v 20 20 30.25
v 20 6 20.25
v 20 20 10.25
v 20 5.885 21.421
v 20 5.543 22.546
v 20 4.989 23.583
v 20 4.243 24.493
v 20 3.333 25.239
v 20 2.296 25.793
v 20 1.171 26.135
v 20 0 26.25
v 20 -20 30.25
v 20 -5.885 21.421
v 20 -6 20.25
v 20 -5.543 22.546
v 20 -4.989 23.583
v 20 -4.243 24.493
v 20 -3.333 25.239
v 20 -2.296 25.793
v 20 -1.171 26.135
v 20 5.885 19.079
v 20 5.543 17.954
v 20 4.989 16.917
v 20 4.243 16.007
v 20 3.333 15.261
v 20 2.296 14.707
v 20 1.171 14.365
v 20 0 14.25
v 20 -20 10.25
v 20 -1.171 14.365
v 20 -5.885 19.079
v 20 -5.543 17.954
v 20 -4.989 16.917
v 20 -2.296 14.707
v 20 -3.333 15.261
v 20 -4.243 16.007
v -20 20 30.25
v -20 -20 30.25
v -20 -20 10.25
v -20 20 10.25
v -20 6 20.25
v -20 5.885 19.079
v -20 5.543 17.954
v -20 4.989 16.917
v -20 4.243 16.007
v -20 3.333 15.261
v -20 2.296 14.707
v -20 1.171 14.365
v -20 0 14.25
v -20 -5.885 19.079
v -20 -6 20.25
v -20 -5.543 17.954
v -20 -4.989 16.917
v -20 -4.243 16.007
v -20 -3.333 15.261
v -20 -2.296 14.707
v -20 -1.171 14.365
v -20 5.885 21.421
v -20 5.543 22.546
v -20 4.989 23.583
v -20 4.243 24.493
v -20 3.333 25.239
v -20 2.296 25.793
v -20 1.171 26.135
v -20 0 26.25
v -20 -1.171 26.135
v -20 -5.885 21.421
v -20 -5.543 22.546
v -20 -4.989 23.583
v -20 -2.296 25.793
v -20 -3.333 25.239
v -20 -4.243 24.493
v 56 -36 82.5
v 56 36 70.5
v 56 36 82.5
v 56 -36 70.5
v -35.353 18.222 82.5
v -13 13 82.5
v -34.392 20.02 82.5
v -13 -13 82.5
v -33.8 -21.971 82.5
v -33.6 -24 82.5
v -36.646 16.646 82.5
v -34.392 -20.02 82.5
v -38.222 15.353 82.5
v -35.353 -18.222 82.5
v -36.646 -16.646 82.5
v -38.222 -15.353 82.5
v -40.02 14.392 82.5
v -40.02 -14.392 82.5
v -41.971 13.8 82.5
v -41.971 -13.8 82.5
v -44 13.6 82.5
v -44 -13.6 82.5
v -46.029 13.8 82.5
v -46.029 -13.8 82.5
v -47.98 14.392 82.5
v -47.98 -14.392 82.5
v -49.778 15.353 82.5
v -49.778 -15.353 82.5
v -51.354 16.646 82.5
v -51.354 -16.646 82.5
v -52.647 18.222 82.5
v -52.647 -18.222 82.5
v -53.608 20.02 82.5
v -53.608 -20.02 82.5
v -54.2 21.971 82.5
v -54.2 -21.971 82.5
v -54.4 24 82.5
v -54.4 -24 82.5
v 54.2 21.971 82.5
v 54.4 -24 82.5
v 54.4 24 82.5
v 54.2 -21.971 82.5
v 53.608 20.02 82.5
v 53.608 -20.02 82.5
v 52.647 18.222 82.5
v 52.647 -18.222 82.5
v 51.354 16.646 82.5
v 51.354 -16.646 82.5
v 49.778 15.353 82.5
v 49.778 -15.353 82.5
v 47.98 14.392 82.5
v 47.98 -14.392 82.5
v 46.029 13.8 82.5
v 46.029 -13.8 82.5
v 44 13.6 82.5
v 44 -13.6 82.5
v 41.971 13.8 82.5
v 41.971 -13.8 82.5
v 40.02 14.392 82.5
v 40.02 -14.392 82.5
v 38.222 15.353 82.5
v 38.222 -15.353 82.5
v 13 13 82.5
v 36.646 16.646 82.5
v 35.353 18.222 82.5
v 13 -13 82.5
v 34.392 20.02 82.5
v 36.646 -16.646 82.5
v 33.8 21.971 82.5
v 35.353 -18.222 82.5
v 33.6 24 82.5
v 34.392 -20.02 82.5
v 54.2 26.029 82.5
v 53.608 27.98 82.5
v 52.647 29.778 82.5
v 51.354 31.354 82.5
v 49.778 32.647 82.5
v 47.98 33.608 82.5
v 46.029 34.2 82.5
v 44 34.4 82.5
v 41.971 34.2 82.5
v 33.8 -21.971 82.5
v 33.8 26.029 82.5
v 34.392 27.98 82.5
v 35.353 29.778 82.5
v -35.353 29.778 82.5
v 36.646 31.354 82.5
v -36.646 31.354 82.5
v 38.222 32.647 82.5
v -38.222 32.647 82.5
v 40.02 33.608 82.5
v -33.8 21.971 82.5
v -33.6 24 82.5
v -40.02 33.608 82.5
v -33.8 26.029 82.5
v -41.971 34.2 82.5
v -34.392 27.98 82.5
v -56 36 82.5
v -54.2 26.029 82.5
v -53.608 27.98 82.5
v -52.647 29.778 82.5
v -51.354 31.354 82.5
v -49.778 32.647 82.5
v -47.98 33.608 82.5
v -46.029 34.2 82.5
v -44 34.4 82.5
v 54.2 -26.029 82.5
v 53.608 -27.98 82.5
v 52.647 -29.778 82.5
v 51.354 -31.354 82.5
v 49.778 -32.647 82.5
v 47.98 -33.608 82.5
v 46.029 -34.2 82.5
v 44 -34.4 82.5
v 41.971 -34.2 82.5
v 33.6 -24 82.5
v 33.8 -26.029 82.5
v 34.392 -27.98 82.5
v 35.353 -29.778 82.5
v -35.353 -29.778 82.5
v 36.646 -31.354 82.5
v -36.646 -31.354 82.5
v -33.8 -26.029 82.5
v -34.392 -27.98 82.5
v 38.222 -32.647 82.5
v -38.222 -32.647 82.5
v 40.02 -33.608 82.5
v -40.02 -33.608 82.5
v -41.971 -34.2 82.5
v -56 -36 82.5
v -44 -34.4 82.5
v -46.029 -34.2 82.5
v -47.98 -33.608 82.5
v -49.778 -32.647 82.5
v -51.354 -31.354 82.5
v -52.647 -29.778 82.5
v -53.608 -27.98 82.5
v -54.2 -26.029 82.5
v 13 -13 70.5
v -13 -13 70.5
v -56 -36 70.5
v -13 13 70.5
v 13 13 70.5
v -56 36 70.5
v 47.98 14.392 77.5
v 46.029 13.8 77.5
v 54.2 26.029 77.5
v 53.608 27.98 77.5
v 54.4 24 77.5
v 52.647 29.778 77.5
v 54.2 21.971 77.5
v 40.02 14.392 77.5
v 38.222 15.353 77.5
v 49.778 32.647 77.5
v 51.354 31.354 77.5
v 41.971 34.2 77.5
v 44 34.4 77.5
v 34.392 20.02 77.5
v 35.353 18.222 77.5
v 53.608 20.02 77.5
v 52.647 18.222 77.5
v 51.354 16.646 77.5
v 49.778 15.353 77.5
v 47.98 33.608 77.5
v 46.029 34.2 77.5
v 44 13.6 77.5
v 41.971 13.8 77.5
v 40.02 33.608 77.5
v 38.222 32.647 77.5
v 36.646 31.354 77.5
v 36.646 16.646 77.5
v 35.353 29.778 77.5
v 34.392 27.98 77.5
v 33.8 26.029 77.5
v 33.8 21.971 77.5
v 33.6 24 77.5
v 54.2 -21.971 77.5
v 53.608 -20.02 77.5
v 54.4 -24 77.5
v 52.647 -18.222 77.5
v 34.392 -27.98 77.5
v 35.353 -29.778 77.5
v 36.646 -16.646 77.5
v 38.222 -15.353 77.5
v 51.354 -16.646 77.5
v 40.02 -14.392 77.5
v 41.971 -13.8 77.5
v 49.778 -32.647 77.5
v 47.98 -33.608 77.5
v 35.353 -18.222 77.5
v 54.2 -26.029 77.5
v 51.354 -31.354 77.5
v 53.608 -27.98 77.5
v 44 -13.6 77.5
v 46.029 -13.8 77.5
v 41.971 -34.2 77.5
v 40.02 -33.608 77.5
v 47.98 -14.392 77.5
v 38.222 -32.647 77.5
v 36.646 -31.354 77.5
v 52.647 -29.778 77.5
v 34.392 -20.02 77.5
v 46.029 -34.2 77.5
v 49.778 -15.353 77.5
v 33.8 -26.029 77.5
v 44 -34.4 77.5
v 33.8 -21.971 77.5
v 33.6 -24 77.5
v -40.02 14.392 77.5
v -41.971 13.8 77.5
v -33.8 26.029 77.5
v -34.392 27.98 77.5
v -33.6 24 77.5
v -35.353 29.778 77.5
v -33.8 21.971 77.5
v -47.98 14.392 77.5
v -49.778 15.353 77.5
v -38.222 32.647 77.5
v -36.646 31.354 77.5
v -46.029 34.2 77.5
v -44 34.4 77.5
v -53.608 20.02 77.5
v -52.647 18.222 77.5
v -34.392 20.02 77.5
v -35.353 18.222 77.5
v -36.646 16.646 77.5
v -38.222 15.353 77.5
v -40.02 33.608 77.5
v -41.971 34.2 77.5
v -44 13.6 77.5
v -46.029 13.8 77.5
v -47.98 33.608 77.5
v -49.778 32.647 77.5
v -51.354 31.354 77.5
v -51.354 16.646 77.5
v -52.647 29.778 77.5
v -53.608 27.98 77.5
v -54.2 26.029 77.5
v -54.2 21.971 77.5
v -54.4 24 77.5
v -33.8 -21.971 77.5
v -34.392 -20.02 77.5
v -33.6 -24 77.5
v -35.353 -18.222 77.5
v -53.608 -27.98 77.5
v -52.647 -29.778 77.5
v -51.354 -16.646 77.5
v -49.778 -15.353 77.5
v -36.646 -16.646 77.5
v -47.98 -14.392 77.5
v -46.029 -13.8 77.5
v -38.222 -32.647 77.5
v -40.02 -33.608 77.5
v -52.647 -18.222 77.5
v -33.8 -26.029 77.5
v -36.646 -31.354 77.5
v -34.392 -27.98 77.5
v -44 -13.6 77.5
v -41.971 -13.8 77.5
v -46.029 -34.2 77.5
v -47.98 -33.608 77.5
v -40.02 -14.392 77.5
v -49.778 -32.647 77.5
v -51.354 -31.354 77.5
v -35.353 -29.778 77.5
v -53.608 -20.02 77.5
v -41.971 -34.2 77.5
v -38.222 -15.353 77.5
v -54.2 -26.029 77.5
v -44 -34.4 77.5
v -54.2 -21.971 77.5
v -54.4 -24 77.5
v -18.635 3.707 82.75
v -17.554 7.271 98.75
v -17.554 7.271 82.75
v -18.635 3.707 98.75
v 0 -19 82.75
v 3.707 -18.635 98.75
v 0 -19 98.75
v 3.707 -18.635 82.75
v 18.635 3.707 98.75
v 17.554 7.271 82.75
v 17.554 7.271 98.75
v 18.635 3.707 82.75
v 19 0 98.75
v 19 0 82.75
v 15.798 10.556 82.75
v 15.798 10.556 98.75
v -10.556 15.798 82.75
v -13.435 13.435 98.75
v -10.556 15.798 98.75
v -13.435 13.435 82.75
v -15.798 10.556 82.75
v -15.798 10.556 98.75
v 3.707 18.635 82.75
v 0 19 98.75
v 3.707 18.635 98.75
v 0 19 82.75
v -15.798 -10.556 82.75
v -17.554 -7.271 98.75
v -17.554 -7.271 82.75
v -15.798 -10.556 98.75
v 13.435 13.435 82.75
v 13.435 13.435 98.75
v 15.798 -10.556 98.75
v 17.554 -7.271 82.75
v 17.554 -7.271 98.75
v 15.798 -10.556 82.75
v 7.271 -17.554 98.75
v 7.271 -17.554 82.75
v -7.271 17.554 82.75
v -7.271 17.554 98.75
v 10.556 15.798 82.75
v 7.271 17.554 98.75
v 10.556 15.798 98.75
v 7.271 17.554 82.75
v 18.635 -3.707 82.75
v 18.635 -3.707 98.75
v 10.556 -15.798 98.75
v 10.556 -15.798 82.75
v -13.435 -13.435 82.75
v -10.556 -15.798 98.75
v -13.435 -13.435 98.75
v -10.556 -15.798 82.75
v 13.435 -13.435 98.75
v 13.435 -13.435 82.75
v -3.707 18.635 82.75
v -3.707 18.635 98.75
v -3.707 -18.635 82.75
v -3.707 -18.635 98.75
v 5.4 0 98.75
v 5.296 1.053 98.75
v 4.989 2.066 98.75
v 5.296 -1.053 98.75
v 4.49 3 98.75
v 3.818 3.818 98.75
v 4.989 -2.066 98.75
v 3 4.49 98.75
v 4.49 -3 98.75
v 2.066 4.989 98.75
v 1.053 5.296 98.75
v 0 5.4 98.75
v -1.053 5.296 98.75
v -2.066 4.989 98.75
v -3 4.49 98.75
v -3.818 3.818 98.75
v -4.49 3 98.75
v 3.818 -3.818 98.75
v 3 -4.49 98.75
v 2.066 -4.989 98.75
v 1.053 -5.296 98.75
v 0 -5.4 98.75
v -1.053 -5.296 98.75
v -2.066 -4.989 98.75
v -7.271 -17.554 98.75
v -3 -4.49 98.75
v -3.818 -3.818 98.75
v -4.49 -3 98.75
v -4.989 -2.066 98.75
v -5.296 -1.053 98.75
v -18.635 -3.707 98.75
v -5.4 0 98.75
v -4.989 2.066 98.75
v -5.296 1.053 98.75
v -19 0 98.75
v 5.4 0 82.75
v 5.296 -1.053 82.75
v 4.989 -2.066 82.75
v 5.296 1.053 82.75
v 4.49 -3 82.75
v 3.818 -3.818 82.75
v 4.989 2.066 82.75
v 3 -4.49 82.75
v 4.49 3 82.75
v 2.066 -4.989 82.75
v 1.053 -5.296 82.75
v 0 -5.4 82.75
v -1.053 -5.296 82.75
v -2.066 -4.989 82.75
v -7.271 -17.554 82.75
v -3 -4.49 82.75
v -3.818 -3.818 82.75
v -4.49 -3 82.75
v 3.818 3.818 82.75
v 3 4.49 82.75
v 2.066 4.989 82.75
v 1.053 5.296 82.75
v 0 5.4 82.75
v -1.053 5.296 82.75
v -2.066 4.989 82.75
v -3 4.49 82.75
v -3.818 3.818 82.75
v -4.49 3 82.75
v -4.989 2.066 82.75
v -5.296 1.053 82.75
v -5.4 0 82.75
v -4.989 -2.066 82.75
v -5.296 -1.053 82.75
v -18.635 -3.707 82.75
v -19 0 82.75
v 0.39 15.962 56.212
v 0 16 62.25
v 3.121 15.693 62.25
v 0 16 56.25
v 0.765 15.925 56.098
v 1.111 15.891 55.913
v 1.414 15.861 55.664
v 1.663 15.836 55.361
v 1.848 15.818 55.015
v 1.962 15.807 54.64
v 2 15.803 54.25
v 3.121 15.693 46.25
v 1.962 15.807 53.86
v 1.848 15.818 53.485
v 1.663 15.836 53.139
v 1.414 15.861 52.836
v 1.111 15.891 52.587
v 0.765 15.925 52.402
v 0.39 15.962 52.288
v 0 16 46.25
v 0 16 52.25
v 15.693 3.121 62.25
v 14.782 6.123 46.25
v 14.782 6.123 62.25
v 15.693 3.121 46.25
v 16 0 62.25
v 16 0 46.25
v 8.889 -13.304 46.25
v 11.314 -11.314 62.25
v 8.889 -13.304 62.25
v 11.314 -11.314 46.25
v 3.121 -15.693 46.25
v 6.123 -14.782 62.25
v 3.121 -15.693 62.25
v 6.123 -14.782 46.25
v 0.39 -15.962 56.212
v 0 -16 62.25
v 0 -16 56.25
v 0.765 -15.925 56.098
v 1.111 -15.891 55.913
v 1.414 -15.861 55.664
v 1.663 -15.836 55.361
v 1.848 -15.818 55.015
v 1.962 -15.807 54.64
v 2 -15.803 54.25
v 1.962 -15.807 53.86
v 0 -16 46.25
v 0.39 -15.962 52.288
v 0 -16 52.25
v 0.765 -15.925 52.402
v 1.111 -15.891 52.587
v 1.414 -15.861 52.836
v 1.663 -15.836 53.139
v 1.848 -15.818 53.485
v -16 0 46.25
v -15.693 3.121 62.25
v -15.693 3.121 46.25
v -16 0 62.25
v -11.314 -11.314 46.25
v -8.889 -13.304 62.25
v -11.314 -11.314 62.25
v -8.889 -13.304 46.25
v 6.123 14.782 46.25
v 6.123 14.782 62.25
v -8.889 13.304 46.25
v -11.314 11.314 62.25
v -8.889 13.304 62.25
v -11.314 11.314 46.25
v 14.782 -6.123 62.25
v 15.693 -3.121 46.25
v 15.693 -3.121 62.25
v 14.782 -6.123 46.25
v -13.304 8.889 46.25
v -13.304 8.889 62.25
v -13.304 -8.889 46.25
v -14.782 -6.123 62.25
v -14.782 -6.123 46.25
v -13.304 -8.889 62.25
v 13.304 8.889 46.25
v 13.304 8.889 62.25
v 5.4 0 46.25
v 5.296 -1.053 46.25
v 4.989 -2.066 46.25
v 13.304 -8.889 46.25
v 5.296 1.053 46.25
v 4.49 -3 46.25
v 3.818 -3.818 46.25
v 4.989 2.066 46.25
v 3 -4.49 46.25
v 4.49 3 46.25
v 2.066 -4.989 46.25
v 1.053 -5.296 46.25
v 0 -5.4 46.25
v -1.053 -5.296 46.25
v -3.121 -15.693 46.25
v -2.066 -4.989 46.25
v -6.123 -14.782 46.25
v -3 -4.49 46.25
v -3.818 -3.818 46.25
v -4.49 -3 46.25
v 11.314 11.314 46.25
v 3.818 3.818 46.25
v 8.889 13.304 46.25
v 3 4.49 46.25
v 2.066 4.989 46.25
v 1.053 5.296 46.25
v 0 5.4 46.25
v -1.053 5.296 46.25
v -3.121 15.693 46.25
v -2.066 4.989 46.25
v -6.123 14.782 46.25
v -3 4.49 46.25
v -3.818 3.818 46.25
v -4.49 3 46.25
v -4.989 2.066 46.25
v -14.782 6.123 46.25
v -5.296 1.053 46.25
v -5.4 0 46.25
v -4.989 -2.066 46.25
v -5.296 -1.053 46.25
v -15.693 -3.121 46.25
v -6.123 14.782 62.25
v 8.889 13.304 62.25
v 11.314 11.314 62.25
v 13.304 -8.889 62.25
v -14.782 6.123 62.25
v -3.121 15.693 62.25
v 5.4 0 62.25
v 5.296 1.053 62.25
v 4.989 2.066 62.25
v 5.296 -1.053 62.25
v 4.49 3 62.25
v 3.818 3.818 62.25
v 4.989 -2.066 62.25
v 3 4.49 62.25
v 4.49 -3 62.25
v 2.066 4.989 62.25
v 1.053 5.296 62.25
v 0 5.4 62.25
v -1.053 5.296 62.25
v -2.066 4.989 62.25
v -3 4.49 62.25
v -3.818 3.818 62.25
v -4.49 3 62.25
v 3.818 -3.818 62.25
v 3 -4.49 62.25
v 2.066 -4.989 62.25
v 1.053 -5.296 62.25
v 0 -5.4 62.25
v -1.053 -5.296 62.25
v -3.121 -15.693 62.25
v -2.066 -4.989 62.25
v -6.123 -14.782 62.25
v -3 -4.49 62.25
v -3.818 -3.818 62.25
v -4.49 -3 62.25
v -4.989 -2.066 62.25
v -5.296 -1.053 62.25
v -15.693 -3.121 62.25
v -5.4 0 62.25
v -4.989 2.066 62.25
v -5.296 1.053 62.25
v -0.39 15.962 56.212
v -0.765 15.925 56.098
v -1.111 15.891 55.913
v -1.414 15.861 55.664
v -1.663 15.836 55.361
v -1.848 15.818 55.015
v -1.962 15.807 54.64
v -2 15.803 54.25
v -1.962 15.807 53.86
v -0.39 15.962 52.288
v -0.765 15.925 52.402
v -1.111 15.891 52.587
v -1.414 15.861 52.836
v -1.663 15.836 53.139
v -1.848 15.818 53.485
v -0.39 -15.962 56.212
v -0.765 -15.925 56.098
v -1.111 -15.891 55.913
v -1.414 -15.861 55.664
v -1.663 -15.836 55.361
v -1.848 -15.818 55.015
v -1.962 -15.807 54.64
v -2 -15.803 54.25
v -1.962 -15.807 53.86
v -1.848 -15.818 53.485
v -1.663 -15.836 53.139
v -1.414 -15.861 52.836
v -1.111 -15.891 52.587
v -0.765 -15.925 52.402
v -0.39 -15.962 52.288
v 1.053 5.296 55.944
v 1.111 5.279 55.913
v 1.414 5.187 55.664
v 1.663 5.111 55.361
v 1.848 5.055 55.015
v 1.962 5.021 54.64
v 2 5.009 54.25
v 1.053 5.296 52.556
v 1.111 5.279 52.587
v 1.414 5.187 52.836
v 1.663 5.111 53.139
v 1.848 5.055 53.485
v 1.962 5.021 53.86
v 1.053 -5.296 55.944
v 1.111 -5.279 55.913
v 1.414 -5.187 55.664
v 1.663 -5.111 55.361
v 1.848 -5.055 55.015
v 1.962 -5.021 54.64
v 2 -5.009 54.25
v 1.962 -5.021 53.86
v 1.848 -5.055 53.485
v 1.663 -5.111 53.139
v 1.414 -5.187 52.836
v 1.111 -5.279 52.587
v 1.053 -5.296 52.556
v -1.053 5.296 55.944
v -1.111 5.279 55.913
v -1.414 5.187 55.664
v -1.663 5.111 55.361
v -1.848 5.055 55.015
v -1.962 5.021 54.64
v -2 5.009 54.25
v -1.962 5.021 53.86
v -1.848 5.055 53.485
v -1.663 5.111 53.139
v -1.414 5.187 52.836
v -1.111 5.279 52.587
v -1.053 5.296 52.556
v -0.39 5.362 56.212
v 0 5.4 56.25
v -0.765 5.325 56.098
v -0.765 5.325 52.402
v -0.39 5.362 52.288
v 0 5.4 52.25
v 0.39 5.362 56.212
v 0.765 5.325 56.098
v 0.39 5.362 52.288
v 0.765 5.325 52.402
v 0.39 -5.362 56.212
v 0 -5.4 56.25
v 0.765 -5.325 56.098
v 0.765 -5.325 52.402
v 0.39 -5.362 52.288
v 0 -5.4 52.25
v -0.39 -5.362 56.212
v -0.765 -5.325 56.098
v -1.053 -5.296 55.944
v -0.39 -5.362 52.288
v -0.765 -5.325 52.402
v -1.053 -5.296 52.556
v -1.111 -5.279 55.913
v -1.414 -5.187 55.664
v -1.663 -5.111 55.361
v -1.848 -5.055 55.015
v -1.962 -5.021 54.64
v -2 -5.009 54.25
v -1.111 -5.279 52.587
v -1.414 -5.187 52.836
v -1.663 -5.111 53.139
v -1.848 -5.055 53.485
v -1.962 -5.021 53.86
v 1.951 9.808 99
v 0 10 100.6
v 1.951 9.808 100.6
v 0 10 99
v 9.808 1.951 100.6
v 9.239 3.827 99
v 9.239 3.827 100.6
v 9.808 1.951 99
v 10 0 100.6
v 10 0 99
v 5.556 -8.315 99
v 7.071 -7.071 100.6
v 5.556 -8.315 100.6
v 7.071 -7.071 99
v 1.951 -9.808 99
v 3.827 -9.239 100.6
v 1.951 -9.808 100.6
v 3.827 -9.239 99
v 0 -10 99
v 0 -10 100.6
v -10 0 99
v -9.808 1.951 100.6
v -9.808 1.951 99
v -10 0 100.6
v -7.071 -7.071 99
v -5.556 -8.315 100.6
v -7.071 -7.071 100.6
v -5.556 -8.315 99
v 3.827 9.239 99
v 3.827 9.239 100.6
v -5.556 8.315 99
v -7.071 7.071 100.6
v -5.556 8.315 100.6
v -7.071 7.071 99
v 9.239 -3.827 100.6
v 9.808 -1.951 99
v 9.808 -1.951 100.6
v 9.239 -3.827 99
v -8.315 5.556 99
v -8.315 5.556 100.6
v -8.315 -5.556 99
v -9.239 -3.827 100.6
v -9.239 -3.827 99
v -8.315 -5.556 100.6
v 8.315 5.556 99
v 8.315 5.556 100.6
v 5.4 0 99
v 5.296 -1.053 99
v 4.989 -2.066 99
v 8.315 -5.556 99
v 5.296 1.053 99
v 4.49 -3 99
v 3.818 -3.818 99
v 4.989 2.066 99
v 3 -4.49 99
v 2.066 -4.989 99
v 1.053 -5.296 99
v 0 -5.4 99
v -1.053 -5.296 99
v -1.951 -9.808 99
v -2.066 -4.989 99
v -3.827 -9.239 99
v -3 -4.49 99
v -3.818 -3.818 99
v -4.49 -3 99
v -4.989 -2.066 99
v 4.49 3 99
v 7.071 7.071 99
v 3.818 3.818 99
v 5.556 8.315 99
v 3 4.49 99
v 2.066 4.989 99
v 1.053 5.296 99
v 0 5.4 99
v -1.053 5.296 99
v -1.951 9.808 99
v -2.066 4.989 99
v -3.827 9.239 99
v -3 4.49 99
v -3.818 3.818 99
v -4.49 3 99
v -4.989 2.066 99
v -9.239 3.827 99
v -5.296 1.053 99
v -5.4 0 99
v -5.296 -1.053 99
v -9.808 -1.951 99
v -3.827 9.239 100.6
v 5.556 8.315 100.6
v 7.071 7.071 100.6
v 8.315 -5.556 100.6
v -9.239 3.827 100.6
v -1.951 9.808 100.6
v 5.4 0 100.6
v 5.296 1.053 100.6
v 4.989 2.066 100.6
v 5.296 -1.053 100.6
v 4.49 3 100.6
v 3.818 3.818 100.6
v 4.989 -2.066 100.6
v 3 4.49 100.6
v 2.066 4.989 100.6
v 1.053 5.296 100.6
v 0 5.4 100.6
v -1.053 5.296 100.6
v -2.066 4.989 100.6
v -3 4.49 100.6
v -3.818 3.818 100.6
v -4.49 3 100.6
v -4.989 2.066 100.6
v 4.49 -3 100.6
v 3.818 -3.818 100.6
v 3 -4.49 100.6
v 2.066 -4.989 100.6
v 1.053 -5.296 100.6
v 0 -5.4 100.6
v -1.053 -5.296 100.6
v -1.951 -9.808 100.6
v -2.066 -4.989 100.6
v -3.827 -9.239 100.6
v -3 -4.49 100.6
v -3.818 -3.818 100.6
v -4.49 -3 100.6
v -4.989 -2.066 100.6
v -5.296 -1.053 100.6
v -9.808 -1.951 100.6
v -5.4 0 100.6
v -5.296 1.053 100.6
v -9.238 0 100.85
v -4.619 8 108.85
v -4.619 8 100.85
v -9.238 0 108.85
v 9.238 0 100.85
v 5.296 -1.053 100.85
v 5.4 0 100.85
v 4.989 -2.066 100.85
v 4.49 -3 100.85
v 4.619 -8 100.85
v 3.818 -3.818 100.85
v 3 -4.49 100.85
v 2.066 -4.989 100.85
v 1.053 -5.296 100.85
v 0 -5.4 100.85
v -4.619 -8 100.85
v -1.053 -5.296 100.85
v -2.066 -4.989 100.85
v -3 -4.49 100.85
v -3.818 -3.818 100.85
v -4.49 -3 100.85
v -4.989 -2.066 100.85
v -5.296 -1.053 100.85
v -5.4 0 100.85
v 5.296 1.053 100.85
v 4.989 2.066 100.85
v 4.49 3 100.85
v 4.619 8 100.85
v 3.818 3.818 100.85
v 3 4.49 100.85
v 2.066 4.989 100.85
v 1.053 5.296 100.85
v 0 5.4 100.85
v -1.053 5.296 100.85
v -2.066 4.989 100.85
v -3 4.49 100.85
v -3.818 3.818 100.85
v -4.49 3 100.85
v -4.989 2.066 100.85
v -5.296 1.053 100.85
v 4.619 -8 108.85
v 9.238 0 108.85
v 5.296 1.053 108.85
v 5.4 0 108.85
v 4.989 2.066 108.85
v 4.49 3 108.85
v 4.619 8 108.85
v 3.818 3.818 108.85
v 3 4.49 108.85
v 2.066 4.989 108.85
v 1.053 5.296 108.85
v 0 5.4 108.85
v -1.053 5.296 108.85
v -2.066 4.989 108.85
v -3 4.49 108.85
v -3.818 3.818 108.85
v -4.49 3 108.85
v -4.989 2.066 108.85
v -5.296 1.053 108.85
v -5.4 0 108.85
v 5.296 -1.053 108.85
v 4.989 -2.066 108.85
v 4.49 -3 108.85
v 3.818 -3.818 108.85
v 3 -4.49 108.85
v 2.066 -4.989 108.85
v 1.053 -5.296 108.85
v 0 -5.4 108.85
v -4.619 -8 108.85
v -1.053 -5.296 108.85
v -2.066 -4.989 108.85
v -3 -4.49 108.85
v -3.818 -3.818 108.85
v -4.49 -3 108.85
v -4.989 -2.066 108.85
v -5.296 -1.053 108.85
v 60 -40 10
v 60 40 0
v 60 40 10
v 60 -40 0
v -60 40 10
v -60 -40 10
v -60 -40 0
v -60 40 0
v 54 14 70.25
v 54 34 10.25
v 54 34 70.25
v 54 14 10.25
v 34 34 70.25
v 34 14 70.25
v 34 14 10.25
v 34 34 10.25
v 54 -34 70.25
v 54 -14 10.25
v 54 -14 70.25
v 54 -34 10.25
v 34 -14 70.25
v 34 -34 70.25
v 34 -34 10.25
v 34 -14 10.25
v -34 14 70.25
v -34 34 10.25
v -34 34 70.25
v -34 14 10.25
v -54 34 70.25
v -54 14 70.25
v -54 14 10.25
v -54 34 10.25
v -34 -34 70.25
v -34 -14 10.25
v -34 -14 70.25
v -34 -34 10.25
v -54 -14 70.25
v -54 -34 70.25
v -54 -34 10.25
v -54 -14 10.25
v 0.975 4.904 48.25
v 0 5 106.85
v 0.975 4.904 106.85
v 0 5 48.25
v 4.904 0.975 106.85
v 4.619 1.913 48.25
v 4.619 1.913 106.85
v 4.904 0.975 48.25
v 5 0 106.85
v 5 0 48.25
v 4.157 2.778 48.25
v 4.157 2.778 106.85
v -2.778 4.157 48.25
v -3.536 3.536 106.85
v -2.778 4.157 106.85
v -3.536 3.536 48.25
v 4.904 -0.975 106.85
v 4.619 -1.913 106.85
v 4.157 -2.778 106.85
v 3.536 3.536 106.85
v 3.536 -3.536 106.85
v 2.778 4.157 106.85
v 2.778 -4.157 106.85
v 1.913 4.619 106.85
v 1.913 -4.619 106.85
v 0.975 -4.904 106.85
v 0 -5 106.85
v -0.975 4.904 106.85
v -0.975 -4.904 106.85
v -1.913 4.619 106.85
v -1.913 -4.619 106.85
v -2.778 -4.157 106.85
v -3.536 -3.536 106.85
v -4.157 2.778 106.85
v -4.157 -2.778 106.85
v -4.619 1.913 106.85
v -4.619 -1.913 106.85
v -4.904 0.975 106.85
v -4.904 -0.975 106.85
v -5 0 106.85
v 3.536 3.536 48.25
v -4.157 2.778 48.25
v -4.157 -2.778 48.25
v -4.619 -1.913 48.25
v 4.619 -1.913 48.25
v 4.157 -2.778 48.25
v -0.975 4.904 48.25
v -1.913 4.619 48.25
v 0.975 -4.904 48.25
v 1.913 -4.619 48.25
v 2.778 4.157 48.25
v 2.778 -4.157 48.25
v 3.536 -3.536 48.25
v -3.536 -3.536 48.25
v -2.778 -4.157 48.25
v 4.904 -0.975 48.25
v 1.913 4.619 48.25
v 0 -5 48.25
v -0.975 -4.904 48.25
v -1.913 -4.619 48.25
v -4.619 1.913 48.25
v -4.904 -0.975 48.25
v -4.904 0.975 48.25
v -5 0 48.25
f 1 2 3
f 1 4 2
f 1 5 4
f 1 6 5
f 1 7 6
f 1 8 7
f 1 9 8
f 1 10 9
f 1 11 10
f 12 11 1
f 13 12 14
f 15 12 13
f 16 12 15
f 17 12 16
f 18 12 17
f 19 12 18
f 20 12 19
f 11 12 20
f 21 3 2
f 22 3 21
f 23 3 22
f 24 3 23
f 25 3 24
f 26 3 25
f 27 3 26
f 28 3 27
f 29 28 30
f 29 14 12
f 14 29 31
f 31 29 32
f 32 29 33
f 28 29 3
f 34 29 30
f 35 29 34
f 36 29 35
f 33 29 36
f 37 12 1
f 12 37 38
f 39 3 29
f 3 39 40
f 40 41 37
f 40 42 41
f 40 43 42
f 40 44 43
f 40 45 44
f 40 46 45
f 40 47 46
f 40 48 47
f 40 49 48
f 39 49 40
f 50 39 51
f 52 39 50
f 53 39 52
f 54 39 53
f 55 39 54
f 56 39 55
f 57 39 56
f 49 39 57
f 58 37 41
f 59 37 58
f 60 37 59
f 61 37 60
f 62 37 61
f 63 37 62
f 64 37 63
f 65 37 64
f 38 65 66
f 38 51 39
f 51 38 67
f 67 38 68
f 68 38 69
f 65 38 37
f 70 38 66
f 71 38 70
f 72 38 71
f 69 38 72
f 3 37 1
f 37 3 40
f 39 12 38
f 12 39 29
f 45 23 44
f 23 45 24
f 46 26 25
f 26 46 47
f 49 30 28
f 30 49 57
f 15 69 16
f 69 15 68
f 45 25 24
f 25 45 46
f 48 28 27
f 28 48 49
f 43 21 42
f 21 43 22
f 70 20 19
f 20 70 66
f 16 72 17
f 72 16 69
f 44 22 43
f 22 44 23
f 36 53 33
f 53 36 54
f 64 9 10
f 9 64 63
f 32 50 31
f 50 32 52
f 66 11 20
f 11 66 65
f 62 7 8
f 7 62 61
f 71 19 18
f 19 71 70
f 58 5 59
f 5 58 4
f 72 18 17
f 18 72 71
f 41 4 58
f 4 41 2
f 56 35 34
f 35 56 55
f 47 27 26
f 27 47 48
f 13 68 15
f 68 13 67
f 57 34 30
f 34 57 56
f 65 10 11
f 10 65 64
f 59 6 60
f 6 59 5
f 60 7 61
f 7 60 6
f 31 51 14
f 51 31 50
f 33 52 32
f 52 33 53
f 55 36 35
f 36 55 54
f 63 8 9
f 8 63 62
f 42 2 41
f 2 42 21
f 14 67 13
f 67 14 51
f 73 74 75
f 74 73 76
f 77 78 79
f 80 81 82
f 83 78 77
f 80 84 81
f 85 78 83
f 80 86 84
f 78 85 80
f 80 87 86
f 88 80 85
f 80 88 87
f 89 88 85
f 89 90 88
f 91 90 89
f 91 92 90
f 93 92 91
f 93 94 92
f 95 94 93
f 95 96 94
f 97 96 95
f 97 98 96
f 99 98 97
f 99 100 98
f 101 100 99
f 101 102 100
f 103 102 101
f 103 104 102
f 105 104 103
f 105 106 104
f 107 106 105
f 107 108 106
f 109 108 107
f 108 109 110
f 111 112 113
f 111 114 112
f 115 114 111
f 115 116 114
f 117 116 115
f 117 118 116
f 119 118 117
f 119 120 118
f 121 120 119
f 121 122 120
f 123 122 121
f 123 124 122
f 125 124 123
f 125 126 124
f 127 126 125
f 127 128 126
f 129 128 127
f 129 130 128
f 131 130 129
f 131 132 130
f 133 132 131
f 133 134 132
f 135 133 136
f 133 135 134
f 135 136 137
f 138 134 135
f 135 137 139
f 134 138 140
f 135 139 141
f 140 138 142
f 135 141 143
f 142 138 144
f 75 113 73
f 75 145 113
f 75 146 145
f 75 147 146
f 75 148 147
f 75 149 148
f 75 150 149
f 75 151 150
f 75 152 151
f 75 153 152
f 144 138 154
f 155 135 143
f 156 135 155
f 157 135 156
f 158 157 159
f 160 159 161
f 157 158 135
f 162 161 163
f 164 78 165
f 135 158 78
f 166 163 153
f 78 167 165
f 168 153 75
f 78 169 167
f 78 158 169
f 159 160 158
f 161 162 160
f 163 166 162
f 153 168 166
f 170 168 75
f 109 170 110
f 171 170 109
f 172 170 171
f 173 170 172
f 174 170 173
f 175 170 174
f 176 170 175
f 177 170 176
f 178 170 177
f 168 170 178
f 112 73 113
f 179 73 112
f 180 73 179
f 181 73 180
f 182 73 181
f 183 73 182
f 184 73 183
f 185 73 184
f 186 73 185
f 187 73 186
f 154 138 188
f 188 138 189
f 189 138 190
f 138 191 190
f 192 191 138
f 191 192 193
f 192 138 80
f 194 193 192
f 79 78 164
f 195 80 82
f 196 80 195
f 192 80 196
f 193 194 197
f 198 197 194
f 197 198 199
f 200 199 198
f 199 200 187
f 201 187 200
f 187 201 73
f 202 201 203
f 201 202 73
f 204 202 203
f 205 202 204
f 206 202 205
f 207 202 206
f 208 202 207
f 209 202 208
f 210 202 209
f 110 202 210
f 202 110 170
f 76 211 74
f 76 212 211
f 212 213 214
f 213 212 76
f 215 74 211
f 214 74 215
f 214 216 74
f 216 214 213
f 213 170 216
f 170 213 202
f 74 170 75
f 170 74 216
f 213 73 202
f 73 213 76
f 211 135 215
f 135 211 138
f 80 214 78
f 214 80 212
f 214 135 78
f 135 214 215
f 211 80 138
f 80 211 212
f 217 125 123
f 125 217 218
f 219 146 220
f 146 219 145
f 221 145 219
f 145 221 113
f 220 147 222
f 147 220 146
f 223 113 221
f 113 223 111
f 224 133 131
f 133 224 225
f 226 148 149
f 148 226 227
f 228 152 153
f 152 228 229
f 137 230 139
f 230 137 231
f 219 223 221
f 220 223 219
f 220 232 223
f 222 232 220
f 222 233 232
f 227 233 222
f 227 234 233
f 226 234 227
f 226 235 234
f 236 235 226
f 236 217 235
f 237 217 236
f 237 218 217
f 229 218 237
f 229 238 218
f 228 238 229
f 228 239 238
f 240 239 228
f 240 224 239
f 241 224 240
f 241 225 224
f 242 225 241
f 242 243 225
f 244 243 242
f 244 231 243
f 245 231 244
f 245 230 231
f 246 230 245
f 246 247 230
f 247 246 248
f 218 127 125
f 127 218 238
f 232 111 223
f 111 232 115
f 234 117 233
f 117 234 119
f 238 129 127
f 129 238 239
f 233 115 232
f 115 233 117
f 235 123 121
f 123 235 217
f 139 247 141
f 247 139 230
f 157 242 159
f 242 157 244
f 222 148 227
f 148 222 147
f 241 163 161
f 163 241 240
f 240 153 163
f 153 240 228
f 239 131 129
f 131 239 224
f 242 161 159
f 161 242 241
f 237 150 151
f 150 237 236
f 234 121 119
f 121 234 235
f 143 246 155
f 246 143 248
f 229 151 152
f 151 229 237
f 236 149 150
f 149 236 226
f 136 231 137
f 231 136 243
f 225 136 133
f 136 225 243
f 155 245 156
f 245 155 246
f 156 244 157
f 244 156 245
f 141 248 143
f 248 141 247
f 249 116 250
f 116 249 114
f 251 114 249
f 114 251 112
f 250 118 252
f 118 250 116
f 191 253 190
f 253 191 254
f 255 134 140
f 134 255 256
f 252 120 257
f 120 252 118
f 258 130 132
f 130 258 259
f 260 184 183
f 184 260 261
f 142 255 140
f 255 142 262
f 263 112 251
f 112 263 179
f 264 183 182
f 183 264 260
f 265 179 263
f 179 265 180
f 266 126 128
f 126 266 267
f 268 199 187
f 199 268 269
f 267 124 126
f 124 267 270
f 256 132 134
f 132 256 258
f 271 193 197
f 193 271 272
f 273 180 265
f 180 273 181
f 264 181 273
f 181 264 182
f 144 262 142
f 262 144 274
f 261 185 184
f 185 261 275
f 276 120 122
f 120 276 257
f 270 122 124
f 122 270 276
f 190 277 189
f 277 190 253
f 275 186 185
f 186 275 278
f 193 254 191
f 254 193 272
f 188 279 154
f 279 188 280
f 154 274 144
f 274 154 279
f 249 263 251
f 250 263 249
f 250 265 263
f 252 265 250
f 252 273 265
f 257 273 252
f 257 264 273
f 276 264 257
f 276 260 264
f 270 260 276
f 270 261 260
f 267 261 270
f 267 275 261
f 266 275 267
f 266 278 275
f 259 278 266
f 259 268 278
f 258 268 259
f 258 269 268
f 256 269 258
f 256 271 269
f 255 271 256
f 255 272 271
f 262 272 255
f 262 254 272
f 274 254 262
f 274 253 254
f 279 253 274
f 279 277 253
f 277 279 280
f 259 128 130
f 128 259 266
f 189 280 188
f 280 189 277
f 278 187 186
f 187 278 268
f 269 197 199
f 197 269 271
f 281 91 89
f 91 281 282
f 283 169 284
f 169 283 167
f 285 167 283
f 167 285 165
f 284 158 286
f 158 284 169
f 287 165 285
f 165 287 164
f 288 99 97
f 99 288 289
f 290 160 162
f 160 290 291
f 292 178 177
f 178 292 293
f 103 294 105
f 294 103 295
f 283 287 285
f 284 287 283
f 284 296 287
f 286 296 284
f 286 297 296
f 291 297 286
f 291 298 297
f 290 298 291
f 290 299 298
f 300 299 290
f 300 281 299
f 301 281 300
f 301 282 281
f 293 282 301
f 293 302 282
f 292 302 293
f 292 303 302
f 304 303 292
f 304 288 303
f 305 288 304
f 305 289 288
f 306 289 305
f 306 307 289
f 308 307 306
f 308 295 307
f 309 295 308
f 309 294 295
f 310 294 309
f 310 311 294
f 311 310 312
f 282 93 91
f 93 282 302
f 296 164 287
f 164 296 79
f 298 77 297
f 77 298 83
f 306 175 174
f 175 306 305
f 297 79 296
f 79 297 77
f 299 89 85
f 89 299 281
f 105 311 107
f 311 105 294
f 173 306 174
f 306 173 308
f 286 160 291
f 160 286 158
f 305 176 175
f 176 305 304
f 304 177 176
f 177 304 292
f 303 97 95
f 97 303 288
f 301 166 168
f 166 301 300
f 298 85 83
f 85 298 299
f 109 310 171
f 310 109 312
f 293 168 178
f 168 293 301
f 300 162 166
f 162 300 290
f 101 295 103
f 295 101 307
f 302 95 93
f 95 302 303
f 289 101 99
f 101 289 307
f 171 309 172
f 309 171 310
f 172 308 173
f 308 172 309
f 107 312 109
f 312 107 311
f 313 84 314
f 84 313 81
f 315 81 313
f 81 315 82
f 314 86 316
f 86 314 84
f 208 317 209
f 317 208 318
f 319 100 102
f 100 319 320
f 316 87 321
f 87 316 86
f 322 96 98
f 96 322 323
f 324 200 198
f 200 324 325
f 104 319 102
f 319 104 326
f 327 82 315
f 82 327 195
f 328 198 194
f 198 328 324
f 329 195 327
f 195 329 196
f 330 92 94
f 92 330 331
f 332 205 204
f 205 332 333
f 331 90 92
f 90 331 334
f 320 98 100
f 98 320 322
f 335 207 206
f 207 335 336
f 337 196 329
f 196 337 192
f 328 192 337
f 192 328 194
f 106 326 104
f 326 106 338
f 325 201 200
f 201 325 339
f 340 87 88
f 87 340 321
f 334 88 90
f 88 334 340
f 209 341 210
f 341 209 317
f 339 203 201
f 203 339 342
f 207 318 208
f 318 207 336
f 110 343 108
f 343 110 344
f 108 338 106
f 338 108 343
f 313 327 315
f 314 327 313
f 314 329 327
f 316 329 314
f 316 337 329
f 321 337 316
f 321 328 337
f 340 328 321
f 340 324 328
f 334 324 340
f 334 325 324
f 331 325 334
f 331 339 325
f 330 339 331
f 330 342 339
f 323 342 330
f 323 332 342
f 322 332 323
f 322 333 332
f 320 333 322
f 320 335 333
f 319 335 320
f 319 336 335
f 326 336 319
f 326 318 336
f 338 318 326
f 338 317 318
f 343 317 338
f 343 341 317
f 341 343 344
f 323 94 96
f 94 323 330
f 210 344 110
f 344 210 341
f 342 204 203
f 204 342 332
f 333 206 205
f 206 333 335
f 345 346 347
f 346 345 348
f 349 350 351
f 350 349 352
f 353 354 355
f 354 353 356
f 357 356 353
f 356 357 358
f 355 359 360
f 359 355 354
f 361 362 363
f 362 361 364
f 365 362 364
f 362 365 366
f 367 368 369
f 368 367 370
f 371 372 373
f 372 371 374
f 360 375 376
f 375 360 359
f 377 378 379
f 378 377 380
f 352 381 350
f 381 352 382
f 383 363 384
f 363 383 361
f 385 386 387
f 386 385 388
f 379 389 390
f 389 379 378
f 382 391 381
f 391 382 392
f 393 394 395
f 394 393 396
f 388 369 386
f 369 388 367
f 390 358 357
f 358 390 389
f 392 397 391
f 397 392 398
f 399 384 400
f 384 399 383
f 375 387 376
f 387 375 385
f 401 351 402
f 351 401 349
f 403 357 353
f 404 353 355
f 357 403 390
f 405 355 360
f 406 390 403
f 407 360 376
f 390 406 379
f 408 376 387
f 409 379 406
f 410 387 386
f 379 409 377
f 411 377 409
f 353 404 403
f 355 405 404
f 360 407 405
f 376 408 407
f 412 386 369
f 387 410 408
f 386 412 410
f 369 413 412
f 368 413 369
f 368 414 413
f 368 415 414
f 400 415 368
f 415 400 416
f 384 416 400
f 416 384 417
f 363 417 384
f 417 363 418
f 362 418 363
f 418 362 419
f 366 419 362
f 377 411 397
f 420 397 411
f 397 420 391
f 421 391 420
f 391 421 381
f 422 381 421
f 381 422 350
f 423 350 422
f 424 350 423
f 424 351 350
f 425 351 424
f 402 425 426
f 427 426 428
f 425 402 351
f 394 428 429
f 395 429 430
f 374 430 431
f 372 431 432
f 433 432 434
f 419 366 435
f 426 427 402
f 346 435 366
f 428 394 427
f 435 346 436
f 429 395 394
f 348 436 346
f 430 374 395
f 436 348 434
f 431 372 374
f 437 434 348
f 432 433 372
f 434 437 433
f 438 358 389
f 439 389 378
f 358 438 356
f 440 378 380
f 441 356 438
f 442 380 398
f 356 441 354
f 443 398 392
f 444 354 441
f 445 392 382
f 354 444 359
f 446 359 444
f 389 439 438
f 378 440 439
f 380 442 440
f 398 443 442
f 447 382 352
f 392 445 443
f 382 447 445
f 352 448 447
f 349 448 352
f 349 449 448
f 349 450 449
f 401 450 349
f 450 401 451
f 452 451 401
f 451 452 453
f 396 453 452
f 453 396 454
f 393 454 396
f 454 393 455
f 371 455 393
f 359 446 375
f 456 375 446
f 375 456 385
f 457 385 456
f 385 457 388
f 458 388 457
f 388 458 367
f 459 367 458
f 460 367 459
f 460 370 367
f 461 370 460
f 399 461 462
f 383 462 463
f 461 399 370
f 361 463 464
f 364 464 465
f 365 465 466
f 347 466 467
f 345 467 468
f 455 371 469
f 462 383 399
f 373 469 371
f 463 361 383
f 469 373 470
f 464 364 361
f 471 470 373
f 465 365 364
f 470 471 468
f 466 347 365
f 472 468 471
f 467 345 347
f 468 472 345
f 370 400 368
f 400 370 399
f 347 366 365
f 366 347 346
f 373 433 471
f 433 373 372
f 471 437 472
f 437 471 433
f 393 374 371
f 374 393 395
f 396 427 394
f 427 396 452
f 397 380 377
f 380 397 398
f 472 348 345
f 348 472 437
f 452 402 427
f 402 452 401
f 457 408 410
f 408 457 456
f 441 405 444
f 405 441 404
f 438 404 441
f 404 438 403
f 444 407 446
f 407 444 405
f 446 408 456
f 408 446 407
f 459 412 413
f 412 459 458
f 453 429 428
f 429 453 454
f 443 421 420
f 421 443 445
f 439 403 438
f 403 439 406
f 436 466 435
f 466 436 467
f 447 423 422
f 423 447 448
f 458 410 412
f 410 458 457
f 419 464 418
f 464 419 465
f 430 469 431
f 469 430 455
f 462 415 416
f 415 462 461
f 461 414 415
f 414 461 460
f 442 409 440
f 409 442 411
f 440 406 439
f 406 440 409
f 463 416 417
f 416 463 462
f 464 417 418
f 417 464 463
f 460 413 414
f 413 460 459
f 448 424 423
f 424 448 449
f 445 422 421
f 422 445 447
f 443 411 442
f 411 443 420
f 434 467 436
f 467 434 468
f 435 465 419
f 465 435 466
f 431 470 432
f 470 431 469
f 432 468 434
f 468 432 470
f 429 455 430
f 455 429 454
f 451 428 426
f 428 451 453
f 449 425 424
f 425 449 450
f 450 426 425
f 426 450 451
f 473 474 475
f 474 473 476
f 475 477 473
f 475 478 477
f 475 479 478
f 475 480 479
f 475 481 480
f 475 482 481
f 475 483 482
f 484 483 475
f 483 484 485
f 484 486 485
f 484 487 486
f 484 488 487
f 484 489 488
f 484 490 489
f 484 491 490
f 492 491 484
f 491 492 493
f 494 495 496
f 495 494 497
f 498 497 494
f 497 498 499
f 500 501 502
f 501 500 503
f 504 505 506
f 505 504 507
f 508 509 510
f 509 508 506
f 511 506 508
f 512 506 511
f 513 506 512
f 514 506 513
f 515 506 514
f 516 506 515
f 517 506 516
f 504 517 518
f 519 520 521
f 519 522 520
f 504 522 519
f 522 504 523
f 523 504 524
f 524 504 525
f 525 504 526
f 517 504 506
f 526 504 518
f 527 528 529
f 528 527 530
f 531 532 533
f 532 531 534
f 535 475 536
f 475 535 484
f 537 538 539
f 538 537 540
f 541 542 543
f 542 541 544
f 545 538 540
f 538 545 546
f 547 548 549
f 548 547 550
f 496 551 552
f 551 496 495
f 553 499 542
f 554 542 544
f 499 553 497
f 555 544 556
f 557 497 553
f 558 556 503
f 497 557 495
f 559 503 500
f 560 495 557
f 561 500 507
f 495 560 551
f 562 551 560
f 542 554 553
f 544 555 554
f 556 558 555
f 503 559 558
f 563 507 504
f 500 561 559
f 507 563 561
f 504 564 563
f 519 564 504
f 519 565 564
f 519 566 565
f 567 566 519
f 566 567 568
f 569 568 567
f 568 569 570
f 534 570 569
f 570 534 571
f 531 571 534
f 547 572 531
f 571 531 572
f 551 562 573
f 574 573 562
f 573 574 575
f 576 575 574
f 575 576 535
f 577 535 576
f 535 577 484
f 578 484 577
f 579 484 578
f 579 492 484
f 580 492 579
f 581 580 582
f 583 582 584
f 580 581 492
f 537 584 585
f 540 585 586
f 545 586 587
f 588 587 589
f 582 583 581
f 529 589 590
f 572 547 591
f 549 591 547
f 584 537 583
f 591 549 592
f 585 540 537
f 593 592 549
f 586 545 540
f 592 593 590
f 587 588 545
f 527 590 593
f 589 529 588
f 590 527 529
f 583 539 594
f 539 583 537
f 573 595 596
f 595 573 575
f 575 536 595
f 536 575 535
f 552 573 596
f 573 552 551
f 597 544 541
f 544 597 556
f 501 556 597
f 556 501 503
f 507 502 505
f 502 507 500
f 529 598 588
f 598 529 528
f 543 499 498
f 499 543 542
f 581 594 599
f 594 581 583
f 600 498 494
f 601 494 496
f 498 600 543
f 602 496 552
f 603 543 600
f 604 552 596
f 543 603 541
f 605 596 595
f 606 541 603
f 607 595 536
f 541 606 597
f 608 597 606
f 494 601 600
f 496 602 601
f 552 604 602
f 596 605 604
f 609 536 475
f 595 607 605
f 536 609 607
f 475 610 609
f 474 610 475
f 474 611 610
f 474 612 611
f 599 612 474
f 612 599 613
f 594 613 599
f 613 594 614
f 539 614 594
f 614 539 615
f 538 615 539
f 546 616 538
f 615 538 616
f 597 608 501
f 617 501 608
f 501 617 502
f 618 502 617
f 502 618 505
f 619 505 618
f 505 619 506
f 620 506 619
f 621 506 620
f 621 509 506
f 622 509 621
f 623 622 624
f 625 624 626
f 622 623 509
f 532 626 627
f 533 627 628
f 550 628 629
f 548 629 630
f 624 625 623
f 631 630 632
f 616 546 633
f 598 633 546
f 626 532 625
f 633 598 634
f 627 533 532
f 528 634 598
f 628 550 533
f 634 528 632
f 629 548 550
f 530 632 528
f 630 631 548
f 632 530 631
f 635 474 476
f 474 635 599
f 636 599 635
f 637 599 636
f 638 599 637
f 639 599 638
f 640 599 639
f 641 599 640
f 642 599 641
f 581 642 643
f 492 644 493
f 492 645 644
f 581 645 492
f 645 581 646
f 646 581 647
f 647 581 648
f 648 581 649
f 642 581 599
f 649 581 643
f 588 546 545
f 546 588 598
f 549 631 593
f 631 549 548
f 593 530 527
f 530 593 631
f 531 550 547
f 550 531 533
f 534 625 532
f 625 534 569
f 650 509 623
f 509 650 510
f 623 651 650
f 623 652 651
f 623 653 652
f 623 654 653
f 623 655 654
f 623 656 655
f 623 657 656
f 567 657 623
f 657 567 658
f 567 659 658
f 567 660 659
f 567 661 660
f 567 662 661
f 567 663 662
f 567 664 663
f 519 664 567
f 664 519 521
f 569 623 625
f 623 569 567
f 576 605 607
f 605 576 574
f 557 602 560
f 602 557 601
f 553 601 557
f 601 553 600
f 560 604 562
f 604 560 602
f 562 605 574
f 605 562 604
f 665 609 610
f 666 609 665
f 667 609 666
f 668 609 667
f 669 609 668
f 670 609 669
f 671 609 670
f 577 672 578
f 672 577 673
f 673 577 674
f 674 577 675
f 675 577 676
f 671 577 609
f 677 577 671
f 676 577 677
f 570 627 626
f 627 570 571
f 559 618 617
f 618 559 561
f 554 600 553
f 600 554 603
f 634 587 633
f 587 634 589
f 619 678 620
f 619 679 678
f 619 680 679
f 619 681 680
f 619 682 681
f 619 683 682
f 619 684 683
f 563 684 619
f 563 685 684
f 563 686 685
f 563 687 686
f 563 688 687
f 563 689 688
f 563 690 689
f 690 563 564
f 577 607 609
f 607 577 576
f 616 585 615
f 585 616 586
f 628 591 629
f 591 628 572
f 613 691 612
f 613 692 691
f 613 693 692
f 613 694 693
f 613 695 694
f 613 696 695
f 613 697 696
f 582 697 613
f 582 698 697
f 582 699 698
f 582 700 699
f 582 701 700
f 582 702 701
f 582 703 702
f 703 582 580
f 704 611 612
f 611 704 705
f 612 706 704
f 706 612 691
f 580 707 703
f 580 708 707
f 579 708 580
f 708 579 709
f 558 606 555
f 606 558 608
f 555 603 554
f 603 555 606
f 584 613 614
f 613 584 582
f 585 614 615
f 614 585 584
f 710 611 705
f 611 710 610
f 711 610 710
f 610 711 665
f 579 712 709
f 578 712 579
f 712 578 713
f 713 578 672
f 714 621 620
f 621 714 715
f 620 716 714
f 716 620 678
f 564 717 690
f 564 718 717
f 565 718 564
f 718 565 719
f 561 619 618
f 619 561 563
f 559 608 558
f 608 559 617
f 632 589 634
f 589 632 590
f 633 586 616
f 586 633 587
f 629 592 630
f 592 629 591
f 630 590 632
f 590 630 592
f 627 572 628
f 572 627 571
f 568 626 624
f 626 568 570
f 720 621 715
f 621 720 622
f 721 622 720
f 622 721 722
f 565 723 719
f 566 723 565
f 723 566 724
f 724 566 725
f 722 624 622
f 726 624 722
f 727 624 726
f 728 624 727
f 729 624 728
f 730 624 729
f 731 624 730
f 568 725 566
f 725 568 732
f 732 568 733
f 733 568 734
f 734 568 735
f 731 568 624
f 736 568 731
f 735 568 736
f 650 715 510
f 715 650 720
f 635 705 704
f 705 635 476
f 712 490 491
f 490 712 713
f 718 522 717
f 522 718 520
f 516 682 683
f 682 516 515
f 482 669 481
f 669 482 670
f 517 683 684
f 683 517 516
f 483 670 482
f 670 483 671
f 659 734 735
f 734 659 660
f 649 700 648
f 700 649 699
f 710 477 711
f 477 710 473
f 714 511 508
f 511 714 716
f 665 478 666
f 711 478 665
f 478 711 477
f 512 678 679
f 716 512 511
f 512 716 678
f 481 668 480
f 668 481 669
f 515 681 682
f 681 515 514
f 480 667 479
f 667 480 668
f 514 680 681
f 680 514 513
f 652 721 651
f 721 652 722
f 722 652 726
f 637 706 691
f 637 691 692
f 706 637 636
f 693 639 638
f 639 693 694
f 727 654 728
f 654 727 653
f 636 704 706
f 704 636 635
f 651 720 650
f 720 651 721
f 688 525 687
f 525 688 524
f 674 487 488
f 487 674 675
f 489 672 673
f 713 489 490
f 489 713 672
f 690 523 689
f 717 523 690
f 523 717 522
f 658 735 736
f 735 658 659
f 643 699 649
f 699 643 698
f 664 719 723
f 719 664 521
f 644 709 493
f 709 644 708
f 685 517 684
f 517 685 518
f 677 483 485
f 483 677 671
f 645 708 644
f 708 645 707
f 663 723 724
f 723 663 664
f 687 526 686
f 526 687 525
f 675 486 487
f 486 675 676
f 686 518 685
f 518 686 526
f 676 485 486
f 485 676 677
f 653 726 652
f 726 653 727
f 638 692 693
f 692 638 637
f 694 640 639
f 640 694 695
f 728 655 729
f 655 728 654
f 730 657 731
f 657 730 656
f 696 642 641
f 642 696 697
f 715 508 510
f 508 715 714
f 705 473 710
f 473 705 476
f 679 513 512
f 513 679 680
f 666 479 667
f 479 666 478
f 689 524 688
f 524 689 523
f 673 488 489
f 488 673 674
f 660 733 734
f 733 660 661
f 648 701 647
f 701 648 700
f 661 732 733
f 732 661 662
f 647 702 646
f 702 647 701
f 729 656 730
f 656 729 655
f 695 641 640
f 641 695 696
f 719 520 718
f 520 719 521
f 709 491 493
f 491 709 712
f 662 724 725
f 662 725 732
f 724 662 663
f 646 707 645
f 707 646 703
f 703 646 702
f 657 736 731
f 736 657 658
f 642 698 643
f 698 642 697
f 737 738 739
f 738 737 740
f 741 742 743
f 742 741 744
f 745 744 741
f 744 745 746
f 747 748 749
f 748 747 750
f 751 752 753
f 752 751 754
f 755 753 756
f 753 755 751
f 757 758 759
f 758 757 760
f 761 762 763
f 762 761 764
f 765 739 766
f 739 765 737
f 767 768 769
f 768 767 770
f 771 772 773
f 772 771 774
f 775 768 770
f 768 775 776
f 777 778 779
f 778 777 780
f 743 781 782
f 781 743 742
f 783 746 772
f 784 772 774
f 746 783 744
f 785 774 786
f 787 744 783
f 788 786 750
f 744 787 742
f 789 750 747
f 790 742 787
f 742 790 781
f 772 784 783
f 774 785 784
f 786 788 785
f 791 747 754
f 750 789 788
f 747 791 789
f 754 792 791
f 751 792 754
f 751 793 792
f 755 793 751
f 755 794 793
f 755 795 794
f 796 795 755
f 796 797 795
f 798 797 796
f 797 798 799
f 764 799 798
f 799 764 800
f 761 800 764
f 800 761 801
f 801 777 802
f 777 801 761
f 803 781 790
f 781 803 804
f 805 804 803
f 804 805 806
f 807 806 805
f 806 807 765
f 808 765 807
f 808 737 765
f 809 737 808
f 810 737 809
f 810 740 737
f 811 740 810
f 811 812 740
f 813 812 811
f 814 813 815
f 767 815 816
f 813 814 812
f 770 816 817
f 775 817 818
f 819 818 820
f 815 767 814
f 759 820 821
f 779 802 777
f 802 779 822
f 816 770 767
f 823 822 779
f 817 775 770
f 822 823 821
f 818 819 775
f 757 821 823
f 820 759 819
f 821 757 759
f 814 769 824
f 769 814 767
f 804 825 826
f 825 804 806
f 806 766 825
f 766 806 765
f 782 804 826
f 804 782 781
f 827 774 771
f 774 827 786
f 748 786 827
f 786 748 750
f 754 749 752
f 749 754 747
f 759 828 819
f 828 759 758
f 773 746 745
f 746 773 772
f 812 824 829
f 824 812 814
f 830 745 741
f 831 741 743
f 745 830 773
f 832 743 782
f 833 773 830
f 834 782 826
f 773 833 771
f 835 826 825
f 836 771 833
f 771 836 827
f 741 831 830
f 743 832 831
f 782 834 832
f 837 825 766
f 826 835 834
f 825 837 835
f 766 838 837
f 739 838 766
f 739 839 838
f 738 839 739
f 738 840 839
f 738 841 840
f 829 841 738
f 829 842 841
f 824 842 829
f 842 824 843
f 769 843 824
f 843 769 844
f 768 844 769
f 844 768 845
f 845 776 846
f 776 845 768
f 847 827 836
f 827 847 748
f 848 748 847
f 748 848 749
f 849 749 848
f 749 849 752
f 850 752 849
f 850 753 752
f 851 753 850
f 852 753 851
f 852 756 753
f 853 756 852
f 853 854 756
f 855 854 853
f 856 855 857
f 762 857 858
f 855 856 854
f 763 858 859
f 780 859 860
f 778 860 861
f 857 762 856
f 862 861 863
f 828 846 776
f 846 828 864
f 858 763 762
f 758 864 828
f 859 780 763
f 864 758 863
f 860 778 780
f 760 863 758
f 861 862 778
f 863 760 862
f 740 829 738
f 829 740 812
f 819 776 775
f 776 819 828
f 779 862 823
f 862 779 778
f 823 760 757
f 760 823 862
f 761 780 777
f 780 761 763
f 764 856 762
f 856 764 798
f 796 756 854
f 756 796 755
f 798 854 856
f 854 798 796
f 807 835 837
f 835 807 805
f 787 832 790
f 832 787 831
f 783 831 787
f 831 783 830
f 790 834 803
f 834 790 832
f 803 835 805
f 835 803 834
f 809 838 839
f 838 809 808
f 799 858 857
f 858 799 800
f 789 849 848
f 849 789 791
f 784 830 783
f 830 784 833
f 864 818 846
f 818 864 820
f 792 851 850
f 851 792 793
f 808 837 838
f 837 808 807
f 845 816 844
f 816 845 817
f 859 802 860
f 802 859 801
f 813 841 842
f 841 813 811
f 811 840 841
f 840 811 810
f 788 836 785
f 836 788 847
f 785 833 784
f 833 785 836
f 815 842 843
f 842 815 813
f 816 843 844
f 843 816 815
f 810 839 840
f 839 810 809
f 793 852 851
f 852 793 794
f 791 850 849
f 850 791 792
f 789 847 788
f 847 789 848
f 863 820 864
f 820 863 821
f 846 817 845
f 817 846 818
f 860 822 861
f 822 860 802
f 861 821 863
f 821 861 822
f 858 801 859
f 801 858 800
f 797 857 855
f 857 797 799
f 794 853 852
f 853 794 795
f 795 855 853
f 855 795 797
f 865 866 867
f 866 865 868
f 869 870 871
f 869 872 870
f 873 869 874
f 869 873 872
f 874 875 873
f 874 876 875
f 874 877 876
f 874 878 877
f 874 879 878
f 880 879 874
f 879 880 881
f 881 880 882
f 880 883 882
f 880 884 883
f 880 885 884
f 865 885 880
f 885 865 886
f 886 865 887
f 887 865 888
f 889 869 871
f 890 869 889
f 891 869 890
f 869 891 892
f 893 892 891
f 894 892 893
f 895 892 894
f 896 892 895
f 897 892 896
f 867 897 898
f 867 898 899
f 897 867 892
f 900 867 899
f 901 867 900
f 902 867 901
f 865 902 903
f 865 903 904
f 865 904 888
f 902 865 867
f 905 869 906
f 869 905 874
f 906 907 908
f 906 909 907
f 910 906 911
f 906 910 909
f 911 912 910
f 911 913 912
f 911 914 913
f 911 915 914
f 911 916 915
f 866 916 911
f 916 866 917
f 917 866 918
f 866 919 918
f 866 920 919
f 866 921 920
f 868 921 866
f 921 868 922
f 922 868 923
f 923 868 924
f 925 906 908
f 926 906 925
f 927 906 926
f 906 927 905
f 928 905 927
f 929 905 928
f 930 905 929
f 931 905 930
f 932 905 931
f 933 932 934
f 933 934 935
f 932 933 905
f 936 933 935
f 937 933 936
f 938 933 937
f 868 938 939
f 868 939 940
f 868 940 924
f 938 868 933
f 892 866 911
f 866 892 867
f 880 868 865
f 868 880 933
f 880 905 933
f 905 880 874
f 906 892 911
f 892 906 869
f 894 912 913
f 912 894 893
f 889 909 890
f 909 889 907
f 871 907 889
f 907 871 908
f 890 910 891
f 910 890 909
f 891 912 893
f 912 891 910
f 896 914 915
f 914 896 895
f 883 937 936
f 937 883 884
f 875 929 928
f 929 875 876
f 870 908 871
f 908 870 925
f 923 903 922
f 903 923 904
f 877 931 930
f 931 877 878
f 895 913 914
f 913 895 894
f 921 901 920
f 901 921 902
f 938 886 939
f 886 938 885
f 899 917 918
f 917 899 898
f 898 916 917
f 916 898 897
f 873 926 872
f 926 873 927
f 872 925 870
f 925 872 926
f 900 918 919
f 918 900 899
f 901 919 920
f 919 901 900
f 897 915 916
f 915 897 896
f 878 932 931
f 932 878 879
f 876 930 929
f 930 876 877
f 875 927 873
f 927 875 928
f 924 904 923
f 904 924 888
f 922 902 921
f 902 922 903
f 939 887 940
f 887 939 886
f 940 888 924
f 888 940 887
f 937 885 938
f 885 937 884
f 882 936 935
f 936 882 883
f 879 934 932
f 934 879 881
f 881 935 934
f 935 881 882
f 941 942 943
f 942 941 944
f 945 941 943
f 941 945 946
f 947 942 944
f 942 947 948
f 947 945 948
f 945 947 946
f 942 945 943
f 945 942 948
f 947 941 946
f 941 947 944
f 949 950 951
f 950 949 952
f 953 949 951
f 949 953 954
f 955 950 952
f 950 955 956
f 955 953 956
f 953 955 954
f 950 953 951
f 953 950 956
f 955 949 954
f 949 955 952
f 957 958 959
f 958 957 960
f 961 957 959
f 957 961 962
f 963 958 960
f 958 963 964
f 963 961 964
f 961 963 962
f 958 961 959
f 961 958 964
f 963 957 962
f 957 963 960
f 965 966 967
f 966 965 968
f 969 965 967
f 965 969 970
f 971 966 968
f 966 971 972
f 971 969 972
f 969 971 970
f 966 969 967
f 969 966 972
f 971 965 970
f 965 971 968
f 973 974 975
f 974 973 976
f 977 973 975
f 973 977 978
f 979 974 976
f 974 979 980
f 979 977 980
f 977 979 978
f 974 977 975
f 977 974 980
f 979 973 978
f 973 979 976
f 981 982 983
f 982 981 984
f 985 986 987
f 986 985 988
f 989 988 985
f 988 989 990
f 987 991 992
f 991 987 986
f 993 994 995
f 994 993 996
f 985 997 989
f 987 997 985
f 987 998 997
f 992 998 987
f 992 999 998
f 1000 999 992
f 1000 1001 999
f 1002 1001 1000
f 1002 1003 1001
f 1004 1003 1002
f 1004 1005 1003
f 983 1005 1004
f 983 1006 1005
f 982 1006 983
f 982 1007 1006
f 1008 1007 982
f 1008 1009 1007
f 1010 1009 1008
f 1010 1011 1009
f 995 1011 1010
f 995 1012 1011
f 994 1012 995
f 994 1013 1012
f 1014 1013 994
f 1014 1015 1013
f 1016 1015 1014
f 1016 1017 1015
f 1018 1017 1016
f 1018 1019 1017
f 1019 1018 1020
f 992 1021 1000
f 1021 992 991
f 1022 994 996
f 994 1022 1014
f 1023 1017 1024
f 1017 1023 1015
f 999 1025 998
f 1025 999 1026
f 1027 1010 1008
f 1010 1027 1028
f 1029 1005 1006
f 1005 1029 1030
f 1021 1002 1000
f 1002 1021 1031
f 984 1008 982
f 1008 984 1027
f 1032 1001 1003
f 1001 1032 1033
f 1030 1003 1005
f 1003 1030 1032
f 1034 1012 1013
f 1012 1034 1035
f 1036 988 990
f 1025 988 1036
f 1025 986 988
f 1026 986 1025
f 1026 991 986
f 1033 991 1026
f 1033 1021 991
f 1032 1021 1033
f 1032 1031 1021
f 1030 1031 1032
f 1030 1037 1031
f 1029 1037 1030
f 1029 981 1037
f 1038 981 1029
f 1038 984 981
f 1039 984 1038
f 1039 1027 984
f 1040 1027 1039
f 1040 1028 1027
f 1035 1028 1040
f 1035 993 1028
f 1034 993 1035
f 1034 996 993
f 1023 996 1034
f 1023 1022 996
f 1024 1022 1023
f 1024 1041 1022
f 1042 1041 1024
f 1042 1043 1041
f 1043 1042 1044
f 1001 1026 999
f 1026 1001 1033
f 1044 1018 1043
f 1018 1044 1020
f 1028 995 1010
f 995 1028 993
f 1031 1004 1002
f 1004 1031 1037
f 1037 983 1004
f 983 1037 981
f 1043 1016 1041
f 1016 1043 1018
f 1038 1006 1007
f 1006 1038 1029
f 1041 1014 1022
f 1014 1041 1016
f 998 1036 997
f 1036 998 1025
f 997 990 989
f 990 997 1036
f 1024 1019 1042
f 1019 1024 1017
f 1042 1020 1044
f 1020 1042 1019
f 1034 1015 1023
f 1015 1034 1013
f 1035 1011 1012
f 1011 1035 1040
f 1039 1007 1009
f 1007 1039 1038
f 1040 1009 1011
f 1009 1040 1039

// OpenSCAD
$fn = 32;

// ------------------------------------------------------------------------
// Arbor press fixture: screw d10, posts 60 mm, gap 16 mm
// Every part is its own module, assembly() places every instance.
// ------------------------------------------------------------------------

// --- part 1 ---
module press_bed() {
  difference() {
    translate([-60, -40, 0]) cube([120, 80, 10]);
  }
}

// --- part 2 ---
module anvil_block() {
  difference() {
    translate([-20, -20, 0]) cube([40, 40, 20]);
    translate([0, 0, 10]) rotate([0, 90, 0]) cylinder(h = 42, d = 12, center = true);
  }
}

// --- part 3 ---
module press_post_a() {
  translate([-10, -10, 0]) cube([20, 20, 60]);
}

// --- part 4 ---
module press_post_b() {
  translate([-10, -10, 0]) cube([20, 20, 60]);
}

// --- part 5 ---
module press_post_c() {
  translate([-10, -10, 0]) cube([20, 20, 60]);
}

// --- part 6 ---
module press_post_d() {
  translate([-10, -10, 0]) cube([20, 20, 60]);
}

// --- part 7 ---
module press_frame() {
  difference() {
    translate([-56, -36, 0]) cube([112, 72, 12]);
    translate([-13, -13, -1]) cube([26, 26, 14]);
    translate([44, 24, 7]) cylinder(h = 6, d = 20.8);
    translate([44, -24, 7]) cylinder(h = 6, d = 20.8);
    translate([-44, 24, 7]) cylinder(h = 6, d = 20.8);
    translate([-44, -24, 7]) cylinder(h = 6, d = 20.8);
  }
}

// --- part 8 ---
module guide_ring() {
  difference() {
      translate([0, 0, 0]) cylinder(h = 16, d = 38);
      translate([0, 0, -1]) cylinder(h = 18, d = 10.8);
    }
}

// --- part 9 ---
module press_screw() {
  translate([0, 0, -29.3]) cylinder(h = 58.6, d = 10);
}

// --- part 10 ---
module press_head() {
  difference() {
    cylinder(h = 16, d = 32);
    translate([0, 0, -1]) cylinder(h = 18, d = 10.8);
    translate([0, 0, 8]) rotate([90, 0, 0]) cylinder(h = 34, d = 4, center = true);
  }
}

// --- part 11 ---
module nut_washer() {
  difference() {
      translate([0, 0, 0]) cylinder(h = 1.6, d = 20);
      translate([0, 0, -1]) cylinder(h = 3.6, d = 10.8);
    }
}

// --- part 12 ---
module press_nut() {
  difference() {
    linear_extrude(height = 8) polygon(points = [[9.238, 0], [4.619, 8], [-4.619, 8], [-9.238, 0], [-4.619, -8], [4.619, -8]]);
    translate([0, 0, -1]) cylinder(h = 10, d = 10.8);
  }
}

// --- assembly ---
module assembly() {
  color([0.80, 0.24, 0.20]) translate([0, 0, 0]) rotate([0, 0, 0]) press_bed();
  color([0.20, 0.45, 0.75]) translate([0, 0, 10.25]) rotate([0, 0, 0]) anvil_block();
  color([0.25, 0.62, 0.32]) translate([44, 24, 10.25]) rotate([0, 0, 0]) press_post_a();
  color([0.92, 0.70, 0.18]) translate([44, -24, 10.25]) rotate([0, 0, 0]) press_post_b();
  color([0.58, 0.35, 0.70]) translate([-44, 24, 10.25]) rotate([0, 0, 0]) press_post_c();
  color([0.16, 0.66, 0.66]) translate([-44, -24, 10.25]) rotate([0, 0, 0]) press_post_d();
  color([0.85, 0.48, 0.18]) translate([0, 0, 70.5]) rotate([0, 0, 0]) press_frame();
  color([0.55, 0.60, 0.65]) translate([0, 0, 82.75]) rotate([0, 0, 0]) guide_ring();
  color([0.75, 0.30, 0.55]) translate([0, 0, 77.55]) rotate([0, 0, 0]) press_screw();
  color([0.42, 0.52, 0.28]) translate([0, 0, 46.25]) rotate([0, 0, 0]) press_head();
  color([0.80, 0.24, 0.20]) translate([0, 0, 99]) rotate([0, 0, 0]) nut_washer();
  color([0.20, 0.45, 0.75]) translate([0, 0, 100.85]) rotate([0, 0, 0]) press_nut();
}

assembly();
